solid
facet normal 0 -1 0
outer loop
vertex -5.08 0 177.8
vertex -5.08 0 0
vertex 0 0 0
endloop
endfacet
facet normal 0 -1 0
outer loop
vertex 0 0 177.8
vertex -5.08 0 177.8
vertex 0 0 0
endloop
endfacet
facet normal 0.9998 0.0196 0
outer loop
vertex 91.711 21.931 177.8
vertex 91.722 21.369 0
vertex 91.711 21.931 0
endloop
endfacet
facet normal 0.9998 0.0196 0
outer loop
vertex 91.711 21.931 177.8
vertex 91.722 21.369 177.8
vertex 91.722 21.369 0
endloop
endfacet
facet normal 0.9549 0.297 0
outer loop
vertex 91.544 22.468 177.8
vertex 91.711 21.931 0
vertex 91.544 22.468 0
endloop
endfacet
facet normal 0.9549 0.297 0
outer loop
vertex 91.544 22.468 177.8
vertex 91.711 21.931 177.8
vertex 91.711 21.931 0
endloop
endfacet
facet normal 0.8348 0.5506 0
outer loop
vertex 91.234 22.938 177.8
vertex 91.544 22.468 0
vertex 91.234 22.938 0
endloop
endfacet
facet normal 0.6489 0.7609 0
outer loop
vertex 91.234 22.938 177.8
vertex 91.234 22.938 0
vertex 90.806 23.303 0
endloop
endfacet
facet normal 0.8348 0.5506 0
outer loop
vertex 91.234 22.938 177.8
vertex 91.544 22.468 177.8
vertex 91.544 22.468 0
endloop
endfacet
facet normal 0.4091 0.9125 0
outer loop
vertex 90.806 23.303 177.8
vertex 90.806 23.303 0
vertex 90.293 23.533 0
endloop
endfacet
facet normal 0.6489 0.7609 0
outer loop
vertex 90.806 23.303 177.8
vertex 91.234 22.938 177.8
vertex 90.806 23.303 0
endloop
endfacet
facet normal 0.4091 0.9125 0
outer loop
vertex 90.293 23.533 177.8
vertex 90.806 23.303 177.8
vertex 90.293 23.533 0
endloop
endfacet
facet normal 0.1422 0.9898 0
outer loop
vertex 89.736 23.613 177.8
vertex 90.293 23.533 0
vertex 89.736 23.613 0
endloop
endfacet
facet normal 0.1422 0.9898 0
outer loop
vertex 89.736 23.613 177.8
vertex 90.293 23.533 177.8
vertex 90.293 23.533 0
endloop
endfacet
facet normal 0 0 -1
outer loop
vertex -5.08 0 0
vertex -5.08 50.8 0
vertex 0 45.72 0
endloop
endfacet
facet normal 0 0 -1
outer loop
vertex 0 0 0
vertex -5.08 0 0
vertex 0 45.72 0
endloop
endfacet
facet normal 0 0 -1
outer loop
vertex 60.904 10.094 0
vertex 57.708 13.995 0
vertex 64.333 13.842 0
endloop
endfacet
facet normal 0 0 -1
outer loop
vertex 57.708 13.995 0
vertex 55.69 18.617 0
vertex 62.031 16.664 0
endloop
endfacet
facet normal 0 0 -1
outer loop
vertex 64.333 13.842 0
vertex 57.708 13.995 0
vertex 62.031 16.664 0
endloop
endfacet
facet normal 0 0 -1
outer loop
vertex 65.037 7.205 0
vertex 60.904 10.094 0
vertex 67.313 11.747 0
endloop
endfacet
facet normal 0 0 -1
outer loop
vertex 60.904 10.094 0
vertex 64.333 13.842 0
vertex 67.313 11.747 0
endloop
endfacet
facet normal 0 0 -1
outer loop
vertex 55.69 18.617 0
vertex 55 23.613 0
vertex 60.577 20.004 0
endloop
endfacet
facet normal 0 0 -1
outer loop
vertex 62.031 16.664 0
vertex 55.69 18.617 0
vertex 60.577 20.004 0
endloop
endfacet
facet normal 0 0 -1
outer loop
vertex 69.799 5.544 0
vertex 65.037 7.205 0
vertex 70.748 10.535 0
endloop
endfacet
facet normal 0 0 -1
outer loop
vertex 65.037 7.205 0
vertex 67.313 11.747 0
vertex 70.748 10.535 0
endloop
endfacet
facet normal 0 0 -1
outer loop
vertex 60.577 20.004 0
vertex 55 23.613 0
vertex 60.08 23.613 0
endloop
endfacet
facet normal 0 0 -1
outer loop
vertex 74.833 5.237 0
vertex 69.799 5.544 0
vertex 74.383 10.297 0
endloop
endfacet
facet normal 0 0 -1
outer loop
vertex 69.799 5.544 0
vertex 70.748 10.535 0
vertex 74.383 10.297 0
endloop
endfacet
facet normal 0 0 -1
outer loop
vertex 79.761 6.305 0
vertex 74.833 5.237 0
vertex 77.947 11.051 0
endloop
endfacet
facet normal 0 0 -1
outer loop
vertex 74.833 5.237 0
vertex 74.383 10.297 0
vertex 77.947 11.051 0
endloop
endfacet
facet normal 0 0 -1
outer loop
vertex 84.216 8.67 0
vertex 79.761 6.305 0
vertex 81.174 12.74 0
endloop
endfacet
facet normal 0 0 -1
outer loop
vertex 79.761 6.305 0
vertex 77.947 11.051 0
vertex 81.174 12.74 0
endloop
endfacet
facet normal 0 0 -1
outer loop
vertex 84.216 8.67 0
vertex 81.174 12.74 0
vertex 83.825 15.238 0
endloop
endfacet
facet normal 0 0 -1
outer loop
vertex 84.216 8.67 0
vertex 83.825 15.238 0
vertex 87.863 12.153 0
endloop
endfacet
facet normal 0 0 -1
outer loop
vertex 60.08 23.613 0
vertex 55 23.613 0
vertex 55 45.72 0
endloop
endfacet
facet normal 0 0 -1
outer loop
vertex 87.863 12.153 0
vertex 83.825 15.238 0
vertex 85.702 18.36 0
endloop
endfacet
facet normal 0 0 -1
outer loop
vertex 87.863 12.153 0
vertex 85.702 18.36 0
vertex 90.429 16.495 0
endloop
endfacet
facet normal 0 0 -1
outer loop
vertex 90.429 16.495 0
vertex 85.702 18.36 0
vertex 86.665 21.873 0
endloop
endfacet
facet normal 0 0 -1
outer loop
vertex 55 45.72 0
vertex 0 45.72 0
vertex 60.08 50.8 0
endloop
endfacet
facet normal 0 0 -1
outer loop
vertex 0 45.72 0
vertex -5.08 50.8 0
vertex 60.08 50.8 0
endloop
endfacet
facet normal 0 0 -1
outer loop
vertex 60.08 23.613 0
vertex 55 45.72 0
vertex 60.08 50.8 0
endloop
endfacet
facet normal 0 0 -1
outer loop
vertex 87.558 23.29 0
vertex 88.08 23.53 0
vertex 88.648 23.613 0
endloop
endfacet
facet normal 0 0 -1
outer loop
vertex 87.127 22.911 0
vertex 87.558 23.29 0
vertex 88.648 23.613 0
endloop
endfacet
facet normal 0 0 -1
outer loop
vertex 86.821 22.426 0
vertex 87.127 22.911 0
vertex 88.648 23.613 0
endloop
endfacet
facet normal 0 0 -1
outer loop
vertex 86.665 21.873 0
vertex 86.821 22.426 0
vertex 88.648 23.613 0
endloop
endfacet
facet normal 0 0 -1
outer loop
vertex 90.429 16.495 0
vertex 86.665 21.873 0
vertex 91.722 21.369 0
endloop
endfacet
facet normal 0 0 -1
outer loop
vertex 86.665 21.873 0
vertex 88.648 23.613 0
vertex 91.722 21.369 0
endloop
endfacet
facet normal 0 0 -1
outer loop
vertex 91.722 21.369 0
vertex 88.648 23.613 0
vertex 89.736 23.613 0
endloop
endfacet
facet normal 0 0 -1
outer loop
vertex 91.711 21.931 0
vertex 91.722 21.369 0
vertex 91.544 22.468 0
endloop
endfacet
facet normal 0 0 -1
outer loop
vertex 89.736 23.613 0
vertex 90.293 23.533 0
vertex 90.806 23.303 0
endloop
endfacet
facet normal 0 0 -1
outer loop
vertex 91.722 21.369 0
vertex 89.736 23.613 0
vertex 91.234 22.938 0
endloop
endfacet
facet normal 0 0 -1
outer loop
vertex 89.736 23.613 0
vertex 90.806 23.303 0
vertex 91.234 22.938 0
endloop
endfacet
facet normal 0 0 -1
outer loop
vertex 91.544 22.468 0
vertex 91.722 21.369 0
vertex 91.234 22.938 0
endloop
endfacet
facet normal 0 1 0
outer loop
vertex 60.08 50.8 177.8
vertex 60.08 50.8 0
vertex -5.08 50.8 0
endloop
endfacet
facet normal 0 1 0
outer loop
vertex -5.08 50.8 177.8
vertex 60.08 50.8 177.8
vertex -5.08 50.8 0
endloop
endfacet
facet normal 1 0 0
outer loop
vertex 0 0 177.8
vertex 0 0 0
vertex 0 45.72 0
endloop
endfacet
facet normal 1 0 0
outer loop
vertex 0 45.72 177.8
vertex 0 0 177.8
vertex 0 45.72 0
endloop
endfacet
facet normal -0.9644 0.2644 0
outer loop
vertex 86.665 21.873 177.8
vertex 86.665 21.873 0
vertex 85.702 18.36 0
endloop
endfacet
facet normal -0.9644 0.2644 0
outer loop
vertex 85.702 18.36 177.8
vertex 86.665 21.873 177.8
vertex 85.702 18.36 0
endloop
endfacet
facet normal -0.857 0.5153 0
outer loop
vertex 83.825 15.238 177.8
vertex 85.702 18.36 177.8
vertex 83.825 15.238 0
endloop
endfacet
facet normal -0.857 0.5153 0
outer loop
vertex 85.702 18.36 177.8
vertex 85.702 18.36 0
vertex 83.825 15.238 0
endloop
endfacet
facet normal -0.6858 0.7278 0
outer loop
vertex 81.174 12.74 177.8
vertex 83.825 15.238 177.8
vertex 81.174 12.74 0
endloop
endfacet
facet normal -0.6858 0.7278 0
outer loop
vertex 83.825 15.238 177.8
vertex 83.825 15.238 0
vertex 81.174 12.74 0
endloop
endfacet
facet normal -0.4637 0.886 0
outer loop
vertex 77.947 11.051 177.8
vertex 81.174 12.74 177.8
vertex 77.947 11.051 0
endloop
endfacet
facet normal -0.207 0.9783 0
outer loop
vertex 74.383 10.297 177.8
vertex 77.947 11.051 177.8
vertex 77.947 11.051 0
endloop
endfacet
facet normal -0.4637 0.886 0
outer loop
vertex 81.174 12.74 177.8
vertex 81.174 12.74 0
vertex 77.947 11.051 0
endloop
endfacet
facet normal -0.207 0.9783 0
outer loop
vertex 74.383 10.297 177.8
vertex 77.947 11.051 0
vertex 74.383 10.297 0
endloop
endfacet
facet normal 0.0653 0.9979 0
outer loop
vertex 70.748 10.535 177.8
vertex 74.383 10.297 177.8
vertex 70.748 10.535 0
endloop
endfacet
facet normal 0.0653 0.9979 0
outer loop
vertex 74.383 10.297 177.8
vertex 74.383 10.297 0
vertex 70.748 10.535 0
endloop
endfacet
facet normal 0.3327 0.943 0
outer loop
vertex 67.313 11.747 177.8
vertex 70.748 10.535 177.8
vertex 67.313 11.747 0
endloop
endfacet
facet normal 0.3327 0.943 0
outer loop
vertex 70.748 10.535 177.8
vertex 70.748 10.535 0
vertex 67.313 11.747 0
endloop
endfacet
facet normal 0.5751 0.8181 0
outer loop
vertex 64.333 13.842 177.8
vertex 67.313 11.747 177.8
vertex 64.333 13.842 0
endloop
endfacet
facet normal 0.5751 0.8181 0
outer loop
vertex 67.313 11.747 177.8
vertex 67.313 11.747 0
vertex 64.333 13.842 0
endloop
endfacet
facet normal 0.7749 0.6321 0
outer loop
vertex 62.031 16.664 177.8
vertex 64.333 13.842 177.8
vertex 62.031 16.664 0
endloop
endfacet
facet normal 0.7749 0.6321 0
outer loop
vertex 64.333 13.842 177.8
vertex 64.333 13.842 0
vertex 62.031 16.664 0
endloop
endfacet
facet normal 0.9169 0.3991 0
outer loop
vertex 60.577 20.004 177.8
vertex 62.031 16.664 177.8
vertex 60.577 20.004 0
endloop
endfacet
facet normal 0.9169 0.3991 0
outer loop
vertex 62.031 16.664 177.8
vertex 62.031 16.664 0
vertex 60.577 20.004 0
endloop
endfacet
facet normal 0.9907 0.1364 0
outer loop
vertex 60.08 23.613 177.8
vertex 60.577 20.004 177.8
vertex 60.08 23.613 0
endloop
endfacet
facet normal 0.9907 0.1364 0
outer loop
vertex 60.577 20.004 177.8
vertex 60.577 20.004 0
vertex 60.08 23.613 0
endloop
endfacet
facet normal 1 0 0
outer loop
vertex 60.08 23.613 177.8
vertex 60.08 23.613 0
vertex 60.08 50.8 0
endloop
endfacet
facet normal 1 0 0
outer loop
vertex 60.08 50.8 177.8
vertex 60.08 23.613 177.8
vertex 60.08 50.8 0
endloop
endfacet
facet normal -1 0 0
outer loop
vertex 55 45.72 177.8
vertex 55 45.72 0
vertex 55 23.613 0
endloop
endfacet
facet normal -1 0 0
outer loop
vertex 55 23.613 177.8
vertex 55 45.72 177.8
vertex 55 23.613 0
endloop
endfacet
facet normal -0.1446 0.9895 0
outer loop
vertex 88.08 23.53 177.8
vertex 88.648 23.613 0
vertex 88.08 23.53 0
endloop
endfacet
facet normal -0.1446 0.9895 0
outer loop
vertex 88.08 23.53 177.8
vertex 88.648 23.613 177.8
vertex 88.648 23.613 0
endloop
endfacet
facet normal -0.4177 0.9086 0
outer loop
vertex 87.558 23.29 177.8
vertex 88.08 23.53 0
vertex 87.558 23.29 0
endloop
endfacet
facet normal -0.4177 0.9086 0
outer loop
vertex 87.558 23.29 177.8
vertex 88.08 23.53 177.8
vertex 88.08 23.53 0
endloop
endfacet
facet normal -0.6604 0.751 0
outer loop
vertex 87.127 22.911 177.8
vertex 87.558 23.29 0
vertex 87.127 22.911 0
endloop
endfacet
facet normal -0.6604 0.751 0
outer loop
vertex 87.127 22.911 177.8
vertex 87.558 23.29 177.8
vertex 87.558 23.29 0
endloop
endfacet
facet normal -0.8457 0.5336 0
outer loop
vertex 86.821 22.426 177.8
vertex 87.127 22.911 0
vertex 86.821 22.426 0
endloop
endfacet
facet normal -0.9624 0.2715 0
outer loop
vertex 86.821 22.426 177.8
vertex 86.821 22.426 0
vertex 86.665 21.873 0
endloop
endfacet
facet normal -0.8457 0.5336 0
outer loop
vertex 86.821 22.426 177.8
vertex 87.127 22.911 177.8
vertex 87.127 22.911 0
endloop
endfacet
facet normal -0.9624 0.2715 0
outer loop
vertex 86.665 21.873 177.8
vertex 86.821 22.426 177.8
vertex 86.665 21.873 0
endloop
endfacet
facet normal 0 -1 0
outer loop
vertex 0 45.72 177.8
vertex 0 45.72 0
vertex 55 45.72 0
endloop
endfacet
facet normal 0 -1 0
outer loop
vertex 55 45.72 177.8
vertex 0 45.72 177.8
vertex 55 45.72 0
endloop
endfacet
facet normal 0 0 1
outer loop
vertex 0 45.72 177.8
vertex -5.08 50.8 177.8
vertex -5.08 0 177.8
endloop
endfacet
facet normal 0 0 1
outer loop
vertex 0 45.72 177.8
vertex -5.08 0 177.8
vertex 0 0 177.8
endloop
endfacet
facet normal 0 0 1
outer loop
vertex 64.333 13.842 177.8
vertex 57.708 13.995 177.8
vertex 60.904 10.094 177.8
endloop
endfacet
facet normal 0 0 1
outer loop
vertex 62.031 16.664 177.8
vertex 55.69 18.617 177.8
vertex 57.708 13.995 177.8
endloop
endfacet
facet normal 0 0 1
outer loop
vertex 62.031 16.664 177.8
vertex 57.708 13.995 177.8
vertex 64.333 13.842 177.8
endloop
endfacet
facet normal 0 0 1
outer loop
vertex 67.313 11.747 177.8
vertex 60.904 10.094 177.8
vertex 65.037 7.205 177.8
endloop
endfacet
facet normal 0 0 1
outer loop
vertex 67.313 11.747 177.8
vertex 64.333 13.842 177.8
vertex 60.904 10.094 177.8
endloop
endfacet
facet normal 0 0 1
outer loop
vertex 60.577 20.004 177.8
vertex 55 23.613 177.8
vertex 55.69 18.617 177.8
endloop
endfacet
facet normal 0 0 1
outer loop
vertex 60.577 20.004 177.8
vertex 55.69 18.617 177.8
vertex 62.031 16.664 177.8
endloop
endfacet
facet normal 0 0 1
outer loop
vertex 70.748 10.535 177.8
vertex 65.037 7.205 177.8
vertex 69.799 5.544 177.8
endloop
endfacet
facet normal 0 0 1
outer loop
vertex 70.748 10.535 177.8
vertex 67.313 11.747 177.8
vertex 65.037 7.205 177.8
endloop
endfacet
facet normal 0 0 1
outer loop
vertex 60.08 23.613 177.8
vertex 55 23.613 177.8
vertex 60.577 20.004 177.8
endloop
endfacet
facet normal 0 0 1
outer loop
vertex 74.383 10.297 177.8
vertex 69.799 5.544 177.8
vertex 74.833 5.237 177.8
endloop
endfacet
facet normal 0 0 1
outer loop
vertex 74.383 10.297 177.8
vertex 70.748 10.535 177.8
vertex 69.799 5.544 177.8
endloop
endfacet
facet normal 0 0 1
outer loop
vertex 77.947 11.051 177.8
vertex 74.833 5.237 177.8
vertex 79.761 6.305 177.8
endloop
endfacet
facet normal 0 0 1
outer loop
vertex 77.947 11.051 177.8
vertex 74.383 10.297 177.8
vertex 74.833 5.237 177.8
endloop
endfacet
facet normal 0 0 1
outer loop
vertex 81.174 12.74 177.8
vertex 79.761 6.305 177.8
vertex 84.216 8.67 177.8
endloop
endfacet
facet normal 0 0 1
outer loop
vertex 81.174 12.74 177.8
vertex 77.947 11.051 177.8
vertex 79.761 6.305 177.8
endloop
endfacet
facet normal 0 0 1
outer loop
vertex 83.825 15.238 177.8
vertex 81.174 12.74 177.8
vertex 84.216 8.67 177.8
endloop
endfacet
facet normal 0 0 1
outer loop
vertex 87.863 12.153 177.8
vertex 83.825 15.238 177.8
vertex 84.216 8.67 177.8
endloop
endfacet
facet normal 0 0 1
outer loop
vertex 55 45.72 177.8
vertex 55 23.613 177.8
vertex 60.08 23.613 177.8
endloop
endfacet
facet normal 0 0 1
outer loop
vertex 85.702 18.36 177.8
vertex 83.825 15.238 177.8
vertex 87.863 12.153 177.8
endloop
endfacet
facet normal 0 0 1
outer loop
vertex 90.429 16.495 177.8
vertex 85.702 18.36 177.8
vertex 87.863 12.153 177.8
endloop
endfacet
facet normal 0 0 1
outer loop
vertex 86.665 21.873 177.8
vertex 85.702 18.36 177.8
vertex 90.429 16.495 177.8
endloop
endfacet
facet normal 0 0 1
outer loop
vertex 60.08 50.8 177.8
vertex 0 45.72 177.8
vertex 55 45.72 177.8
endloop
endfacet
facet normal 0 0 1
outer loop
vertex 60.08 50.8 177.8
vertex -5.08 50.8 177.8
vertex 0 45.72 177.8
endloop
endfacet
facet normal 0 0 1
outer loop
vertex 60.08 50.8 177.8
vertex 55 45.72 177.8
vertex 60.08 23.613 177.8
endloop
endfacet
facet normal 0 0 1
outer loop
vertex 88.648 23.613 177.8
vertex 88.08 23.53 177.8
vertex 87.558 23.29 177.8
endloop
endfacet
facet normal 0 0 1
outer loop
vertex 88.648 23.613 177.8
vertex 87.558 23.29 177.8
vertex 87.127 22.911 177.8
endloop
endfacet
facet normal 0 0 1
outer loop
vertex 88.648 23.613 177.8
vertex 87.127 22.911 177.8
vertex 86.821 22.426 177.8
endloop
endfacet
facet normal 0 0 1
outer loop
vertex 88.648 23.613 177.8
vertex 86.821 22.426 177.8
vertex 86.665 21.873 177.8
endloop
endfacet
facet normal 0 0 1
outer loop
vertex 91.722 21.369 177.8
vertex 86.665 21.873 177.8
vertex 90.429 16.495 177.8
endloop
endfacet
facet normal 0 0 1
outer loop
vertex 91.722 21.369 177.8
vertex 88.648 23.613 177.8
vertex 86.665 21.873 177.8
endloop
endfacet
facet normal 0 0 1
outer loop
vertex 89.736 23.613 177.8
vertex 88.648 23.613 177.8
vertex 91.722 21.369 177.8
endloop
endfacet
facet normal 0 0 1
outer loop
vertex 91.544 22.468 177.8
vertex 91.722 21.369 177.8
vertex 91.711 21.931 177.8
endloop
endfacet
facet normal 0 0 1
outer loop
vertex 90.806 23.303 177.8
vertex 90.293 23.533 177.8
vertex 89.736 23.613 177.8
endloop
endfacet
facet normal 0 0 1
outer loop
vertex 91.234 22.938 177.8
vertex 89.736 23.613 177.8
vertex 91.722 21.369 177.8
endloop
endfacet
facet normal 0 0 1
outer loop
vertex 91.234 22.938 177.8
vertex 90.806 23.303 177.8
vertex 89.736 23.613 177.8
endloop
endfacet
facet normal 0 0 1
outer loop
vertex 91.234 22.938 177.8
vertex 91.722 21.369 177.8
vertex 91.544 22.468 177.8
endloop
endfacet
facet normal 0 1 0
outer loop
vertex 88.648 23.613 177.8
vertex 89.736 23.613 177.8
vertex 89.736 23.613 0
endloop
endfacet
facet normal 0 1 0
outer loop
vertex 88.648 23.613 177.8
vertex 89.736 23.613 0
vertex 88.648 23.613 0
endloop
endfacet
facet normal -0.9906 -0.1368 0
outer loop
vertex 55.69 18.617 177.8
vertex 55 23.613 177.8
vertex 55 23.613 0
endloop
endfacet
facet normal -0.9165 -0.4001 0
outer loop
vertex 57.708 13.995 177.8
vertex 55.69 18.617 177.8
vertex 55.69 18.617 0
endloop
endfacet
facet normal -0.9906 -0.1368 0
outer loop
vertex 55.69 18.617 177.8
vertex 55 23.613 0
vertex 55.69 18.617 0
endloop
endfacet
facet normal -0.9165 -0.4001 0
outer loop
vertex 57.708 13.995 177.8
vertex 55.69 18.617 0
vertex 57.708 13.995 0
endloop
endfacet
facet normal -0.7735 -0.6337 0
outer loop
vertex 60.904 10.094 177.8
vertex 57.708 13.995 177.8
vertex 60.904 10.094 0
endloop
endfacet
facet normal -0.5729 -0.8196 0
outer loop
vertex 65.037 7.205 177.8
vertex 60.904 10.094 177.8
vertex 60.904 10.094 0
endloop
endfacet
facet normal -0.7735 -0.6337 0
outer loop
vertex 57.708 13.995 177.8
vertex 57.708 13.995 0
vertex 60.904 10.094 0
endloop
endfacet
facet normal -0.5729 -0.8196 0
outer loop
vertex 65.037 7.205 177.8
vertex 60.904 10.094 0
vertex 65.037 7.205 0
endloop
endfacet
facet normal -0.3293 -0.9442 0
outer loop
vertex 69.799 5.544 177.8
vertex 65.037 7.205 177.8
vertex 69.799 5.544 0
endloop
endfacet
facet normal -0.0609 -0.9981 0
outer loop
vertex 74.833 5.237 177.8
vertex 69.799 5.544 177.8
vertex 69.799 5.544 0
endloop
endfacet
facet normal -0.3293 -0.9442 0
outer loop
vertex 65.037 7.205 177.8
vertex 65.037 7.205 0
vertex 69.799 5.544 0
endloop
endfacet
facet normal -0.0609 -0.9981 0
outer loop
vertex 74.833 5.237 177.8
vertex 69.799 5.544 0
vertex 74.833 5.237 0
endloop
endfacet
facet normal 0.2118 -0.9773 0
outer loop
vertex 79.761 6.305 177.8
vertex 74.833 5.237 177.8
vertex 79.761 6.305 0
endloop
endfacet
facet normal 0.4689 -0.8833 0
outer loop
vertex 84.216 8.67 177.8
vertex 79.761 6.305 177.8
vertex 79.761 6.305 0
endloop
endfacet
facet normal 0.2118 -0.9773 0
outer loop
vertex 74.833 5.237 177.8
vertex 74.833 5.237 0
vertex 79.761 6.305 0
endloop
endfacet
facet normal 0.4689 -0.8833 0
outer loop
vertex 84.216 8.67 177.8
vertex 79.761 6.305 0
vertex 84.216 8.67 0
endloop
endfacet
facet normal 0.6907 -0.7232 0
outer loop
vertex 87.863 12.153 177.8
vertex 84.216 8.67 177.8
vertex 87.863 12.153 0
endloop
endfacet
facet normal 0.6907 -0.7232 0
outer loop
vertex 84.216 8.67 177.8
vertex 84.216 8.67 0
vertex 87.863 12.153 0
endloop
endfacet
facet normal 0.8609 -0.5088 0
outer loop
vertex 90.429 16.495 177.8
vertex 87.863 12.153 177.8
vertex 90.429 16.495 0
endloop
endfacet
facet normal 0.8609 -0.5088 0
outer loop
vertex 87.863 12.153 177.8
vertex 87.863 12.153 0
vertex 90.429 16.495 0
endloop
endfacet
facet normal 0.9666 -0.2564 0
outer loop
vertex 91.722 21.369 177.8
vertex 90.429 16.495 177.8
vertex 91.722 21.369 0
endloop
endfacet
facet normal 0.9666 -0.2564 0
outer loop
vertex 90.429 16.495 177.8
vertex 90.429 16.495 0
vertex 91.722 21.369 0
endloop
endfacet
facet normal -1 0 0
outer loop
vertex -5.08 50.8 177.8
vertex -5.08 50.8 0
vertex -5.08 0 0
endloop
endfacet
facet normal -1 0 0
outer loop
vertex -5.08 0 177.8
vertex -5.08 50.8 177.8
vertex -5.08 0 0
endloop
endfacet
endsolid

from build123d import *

# Parameters (mm, degrees)
F1_DEPTH = 177.8
F2_R     = 2


with BuildPart() as f1:
    # F0 (on Top) → F1 (new body)
    with BuildSketch(Plane.XY):
        with BuildLine():
            Line((-5.08, 0), (0, 0))
            Line((0, 0), (0, 45.72))
            Line((0, 45.72), (55, 45.72))
            Line((55, 45.72), (55, 23.612564))
            ThreePointArc((55, 23.612564), (73.429315, 5.183249), (91.858629, 23.612564))
            Line((91.858629, 23.612564), (86.778629, 23.612564))
            ThreePointArc((86.778629, 23.612564), (73.429315, 10.263249), (60.08, 23.612564))
            Line((60.08, 23.612564), (60.08, 50.8))
            Line((60.08, 50.8), (-5.08, 50.8))
            Line((-5.08, 50.8), (-5.08, 0))
        make_face()
    extrude(amount=F1_DEPTH)

    # F2
    f2_edges = [f1.edges().sort_by_distance(p)[0] for p in [
        (86.778629, 23.612564, 88.9),
        (91.858629, 23.612564, 88.9),
    ]]
    fillet(f2_edges, radius=F2_R)


solid = f1.part
